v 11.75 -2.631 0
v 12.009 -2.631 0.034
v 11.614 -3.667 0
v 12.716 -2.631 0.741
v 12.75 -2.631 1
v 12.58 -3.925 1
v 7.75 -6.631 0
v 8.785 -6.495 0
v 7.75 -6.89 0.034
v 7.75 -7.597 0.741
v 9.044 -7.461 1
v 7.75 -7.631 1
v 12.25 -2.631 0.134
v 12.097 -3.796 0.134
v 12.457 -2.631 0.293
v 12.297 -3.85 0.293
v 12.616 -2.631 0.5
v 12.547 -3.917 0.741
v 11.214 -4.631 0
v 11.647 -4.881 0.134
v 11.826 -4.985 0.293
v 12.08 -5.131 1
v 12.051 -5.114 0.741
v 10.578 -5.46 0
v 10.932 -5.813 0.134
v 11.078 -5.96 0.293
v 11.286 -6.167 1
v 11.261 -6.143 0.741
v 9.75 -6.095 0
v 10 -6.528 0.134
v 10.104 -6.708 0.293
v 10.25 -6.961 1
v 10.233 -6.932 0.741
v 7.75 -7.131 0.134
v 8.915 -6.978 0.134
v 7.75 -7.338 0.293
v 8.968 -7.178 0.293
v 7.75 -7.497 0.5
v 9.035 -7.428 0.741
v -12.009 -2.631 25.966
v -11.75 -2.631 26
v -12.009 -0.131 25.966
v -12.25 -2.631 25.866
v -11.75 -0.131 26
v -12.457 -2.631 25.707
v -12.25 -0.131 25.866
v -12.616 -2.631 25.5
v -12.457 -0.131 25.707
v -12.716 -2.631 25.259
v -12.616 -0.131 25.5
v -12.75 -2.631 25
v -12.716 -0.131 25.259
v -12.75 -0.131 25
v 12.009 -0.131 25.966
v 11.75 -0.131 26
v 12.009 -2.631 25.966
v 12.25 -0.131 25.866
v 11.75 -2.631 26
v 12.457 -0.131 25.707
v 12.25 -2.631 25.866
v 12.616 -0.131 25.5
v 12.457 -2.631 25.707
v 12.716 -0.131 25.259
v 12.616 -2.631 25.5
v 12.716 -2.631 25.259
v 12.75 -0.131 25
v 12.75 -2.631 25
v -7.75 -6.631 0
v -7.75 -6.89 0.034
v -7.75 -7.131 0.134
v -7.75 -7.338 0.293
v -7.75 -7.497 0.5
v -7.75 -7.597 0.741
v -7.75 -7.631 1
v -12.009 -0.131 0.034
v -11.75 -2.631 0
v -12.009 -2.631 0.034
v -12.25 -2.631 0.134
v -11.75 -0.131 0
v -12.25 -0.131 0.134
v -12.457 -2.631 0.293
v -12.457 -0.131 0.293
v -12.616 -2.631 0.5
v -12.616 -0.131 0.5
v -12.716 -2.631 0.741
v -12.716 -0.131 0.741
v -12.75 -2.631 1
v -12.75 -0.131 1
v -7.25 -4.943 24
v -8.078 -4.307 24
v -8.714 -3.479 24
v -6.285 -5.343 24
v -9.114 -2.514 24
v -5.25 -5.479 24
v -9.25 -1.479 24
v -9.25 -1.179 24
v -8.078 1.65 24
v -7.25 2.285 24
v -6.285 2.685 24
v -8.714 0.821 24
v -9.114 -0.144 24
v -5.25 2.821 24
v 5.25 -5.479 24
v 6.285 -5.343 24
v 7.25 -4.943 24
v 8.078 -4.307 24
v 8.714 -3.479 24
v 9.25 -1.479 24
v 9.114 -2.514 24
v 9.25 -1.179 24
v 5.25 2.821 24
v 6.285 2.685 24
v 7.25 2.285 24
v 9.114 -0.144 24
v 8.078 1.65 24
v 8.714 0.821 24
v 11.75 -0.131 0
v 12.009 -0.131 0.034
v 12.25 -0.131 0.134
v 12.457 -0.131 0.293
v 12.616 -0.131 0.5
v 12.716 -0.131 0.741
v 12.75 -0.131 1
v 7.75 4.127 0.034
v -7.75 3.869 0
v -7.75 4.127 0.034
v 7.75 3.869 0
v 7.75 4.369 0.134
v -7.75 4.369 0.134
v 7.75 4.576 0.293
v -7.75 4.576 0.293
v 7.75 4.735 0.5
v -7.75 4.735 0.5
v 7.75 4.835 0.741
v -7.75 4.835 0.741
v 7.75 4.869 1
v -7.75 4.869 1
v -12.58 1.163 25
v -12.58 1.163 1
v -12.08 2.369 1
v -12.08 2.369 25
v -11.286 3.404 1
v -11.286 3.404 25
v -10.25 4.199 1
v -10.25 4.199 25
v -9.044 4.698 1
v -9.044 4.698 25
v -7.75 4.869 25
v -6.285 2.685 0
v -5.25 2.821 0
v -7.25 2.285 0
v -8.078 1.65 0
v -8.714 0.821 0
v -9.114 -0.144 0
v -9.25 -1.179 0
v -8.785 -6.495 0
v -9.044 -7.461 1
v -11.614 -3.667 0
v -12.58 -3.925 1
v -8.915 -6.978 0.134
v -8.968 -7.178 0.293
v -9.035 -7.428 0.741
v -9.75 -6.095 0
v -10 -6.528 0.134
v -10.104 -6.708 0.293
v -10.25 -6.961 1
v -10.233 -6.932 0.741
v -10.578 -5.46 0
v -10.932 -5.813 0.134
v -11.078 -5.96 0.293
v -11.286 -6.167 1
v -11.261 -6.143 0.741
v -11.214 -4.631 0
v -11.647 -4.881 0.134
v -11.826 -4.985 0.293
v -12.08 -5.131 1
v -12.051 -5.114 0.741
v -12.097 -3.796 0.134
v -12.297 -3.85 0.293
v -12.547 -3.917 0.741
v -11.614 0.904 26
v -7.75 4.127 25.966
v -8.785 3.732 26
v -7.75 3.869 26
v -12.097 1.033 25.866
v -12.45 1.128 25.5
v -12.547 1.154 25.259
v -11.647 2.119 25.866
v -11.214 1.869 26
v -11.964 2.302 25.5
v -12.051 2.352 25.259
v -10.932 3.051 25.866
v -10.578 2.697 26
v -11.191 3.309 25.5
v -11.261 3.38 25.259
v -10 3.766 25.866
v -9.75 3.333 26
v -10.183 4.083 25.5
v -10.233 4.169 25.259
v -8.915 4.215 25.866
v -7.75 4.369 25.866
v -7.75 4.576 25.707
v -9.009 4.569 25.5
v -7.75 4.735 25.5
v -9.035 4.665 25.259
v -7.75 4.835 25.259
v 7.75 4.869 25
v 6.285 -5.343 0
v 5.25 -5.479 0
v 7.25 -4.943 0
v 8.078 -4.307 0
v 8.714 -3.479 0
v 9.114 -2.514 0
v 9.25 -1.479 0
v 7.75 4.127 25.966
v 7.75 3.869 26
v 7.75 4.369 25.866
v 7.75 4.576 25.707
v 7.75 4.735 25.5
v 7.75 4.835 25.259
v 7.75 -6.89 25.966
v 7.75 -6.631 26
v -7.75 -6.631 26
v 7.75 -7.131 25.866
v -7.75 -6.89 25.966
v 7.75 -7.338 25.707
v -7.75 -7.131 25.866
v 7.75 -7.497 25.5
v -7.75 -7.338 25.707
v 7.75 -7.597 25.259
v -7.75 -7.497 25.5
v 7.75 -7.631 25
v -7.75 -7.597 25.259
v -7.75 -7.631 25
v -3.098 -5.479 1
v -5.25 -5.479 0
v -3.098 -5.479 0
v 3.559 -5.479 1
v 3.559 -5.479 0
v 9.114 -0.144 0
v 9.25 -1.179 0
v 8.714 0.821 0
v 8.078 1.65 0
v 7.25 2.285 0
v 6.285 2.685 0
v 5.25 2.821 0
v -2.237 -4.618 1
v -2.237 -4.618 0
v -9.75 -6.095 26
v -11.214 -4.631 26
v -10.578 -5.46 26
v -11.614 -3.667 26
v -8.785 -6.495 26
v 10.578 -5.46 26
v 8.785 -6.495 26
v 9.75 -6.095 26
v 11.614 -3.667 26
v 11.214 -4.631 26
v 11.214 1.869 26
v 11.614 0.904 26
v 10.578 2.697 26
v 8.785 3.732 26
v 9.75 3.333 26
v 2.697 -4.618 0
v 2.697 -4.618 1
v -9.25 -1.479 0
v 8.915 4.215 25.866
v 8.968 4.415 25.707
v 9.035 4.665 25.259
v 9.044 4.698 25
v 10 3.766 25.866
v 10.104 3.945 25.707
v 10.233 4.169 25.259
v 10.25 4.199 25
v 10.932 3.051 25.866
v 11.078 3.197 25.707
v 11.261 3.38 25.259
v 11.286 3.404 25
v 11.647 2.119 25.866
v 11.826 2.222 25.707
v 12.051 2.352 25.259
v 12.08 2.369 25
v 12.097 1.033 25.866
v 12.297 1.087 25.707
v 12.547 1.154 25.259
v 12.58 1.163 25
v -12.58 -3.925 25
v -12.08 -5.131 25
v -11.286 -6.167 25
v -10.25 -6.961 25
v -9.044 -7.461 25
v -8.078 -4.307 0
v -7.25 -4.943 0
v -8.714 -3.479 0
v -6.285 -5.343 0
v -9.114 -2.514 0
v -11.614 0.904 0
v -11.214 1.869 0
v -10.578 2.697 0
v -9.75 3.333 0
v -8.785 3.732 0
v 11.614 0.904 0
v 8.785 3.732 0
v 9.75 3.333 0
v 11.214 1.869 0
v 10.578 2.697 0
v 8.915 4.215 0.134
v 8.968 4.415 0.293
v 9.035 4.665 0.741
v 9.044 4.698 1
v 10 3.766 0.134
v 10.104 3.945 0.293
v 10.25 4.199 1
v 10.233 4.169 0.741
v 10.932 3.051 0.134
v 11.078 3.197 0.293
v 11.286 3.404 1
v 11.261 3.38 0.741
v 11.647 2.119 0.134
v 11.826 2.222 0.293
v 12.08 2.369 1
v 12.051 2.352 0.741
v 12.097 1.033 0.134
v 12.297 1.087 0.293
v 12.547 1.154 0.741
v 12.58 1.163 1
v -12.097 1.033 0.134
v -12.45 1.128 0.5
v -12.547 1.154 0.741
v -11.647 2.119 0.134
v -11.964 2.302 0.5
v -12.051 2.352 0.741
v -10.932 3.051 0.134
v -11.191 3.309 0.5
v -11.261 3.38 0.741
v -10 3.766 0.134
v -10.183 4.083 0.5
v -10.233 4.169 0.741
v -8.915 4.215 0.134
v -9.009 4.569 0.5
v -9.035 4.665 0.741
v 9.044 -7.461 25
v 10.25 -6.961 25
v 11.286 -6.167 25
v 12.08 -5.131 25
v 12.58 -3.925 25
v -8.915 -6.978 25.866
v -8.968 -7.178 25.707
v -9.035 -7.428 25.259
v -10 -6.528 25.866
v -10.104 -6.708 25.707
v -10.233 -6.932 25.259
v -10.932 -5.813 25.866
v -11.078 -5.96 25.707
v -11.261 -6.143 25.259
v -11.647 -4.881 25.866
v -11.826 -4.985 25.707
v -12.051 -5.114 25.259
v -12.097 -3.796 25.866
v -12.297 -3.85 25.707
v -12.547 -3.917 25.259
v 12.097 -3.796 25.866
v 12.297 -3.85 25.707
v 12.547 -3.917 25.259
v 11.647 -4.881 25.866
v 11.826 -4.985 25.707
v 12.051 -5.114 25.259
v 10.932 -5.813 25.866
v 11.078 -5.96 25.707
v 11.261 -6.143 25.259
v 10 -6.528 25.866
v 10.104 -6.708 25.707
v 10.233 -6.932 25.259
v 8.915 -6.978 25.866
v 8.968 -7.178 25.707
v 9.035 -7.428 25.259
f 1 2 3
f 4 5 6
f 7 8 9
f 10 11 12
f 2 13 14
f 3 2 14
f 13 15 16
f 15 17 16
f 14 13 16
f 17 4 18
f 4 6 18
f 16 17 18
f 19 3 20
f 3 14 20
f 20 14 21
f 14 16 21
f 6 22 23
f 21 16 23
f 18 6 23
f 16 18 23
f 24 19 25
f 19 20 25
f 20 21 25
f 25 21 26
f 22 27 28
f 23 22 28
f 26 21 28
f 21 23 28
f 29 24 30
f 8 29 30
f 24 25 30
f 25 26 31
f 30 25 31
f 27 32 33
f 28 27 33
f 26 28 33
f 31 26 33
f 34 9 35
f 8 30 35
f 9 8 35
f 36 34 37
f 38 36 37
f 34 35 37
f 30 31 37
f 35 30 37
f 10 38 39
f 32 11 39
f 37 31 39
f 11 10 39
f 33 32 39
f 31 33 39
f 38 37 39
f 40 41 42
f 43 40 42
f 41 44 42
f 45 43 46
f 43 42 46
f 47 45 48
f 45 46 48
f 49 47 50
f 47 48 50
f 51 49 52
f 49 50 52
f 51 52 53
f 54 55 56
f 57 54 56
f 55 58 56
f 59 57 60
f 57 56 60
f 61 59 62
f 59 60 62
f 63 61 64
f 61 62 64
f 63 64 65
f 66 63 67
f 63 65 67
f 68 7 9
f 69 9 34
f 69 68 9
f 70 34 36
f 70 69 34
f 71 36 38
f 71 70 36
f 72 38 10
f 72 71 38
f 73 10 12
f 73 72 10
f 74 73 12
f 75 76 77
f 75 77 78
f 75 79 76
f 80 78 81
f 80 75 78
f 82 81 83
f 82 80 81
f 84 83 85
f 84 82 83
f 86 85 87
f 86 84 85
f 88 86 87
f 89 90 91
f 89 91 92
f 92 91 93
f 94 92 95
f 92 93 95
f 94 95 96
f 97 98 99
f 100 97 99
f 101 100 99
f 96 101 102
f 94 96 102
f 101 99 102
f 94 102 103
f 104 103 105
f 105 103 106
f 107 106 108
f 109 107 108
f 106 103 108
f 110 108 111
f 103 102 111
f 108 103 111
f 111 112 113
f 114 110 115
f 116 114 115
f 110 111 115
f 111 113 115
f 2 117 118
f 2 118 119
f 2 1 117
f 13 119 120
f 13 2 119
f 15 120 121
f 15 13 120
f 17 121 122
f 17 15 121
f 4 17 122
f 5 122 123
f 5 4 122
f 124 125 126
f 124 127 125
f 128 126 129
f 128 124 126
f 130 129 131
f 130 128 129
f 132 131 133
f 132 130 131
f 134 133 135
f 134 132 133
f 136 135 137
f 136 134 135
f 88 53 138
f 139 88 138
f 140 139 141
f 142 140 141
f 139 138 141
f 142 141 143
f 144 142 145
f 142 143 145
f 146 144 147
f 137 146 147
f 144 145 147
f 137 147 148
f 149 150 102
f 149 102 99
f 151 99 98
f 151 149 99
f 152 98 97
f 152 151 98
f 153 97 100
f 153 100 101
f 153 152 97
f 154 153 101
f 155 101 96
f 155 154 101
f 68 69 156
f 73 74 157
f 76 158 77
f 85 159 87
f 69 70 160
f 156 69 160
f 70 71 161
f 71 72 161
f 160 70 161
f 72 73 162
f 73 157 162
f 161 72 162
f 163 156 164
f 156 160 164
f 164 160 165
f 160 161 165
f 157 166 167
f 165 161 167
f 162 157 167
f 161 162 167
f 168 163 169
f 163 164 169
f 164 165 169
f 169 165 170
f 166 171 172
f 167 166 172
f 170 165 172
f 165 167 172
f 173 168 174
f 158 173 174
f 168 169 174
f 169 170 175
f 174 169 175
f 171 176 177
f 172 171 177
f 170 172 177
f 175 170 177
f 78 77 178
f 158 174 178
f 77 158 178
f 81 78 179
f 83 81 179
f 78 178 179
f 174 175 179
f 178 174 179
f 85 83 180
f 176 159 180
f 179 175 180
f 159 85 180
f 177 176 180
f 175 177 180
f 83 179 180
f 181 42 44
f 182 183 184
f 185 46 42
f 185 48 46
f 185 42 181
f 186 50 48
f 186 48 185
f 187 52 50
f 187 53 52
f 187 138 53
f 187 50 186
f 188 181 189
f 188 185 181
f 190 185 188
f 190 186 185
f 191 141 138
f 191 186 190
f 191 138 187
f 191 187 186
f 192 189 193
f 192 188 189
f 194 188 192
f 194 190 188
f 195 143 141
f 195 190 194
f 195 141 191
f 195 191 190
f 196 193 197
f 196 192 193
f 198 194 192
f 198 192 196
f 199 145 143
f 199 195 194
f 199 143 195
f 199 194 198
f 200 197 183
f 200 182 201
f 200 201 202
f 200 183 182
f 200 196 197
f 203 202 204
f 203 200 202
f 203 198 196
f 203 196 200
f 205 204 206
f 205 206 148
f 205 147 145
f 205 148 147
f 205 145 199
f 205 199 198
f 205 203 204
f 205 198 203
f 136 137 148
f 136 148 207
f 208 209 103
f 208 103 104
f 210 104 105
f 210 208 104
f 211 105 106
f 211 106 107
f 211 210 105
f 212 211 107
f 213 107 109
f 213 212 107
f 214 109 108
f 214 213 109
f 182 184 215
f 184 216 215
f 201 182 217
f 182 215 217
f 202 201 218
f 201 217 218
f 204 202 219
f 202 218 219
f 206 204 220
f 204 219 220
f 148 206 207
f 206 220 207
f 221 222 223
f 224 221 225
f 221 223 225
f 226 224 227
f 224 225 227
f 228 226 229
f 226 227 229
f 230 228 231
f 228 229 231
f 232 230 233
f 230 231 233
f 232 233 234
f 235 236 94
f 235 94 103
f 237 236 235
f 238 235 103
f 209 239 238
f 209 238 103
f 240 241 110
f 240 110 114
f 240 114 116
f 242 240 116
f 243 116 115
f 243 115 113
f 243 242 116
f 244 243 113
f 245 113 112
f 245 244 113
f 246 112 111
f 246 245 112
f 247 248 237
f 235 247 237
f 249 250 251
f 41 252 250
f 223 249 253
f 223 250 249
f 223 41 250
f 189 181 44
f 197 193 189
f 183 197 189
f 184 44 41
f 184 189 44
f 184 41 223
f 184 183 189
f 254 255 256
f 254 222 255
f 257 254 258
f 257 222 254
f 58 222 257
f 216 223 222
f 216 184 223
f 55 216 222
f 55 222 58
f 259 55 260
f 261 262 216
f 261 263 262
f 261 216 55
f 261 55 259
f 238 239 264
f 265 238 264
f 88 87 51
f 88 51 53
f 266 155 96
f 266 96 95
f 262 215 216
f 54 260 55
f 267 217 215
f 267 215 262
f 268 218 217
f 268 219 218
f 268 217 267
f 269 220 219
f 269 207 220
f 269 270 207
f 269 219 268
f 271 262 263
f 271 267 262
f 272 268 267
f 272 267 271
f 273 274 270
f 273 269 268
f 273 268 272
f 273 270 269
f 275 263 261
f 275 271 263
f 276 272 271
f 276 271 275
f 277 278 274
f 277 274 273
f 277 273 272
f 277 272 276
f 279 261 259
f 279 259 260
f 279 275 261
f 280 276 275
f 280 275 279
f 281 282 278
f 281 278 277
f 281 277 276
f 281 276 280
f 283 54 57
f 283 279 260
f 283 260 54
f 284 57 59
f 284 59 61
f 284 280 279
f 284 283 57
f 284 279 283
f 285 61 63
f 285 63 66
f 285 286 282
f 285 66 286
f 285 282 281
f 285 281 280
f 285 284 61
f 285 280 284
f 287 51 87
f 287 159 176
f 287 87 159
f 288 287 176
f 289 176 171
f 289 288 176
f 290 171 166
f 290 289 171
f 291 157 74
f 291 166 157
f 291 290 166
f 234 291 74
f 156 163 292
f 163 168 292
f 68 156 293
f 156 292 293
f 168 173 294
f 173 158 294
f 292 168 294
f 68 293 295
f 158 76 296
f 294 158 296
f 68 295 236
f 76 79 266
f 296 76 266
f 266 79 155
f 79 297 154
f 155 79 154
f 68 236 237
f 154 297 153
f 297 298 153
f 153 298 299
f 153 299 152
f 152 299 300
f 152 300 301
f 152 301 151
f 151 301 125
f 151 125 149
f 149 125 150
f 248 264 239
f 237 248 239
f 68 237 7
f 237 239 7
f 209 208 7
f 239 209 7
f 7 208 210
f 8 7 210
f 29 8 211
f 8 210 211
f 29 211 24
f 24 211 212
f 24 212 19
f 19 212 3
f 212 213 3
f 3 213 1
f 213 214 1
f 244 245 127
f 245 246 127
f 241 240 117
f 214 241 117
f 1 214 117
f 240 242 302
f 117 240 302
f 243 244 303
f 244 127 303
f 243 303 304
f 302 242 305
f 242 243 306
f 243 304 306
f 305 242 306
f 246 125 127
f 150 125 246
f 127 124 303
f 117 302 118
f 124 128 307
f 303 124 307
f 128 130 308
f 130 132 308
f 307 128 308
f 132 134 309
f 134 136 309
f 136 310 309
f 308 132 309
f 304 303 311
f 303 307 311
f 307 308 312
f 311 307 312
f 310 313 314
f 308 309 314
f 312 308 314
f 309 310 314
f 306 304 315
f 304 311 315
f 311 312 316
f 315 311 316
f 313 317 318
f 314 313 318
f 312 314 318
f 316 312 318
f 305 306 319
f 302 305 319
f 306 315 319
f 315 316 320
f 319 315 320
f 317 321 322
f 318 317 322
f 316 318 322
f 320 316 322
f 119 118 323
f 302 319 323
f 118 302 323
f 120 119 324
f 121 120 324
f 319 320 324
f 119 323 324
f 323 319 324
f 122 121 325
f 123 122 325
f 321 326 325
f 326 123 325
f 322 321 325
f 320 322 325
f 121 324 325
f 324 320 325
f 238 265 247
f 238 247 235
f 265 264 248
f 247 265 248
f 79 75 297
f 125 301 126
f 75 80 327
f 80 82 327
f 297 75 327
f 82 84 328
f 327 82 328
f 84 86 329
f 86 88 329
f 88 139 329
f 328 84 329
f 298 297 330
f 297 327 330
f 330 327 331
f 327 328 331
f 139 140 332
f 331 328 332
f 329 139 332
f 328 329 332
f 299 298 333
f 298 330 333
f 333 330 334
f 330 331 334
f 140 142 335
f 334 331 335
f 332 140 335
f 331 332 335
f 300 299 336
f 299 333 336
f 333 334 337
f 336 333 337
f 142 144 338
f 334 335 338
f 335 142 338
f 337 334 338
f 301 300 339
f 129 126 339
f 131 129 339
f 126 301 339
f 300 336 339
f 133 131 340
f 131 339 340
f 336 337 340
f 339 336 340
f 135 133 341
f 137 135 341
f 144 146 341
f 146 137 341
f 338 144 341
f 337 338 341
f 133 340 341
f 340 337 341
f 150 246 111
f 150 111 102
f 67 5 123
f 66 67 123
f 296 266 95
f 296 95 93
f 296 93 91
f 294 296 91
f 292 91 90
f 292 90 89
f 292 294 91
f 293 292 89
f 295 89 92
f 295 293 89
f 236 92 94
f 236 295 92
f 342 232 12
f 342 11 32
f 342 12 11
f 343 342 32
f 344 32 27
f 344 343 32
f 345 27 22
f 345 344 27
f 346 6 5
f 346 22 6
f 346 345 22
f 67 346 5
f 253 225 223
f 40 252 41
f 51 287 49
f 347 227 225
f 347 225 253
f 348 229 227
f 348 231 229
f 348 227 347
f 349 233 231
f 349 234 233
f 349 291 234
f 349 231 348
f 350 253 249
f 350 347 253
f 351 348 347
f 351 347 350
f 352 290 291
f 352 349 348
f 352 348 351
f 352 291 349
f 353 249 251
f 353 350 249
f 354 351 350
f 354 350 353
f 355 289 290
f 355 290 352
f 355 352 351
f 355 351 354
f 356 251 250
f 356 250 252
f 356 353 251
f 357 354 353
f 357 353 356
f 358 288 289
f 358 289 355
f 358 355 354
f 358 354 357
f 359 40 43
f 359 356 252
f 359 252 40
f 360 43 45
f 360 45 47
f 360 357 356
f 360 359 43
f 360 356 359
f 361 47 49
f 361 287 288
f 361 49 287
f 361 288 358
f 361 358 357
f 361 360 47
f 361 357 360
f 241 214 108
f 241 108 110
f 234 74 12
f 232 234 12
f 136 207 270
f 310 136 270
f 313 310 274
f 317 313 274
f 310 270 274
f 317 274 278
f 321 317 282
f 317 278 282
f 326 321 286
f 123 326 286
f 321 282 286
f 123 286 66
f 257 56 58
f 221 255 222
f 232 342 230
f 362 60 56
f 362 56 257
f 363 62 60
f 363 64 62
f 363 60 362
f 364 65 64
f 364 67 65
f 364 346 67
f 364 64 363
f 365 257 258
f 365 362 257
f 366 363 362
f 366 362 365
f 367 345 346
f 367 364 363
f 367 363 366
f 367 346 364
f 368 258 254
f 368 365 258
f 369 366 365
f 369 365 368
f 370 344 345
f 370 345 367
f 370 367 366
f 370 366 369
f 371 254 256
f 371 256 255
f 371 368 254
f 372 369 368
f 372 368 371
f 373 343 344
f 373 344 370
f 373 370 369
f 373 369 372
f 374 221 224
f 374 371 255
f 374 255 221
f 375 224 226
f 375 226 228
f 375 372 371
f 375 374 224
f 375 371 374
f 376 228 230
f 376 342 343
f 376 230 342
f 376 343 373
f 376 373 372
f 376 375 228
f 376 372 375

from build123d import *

# Parameters (mm, degrees)
F1_W     = 25.5
F1_H     = 12.5
F2_DEPTH = 26
F3_DEPTH = 24
F4_R     = 5
F5_R     = 1
F7_DEPTH = 1


with BuildPart() as f2:
    # F1 (on Top) → F2 (new body)
    with BuildSketch(Plane.XY):
        with Locations((0, -1.381356)):
            Rectangle(F1_W, F1_H)
    extrude(amount=F2_DEPTH)

    # F0 (on Top) → F3 (cut)
    with BuildSketch(Plane.XY):
        with BuildLine():
            Line((-5.25, -5.478824), (5.25, -5.478824))
            ThreePointArc((5.25, -5.478824), (8.078427, -4.307251), (9.25, -1.478824))
            Line((9.25, -1.478824), (9.25, -1.178824))
            ThreePointArc((9.25, -1.178824), (8.078427, 1.649603), (5.25, 2.821176))
            Line((5.25, 2.821176), (-5.25, 2.821176))
            ThreePointArc((-5.25, 2.821176), (-8.078427, 1.649603), (-9.25, -1.178824))
            Line((-9.25, -1.178824), (-9.25, -1.478824))
            ThreePointArc((-9.25, -1.478824), (-8.078427, -4.307251), (-5.25, -5.478824))
        make_face()
    extrude(amount=F3_DEPTH, mode=Mode.SUBTRACT)

    # F4
    f4_edges = [f2.edges().sort_by_distance(p)[0] for p in [
        (12.75, -7.631356, 13),
        (12.75, 4.868644, 13),
        (-12.75, -7.631356, 13),
        (-12.75, 4.868644, 13),
    ]]
    fillet(f4_edges, radius=F4_R)

    # F5
    f5_edges = [f2.edges().sort_by_distance(p)[0] for p in [
        (0, 4.868644, 0),
        (0, 4.868644, 26),
    ]]
    fillet(f5_edges, radius=F5_R)

    # F6 (on face) → F7 (join)
    with BuildSketch(Plane.XY):
        Polygon((-2.237371, -4.617726), (-3.124978, -5.505333), (3.585098, -5.505333), (2.697491, -4.617726), align=None)
    extrude(amount=F7_DEPTH)


solid = f2.part
